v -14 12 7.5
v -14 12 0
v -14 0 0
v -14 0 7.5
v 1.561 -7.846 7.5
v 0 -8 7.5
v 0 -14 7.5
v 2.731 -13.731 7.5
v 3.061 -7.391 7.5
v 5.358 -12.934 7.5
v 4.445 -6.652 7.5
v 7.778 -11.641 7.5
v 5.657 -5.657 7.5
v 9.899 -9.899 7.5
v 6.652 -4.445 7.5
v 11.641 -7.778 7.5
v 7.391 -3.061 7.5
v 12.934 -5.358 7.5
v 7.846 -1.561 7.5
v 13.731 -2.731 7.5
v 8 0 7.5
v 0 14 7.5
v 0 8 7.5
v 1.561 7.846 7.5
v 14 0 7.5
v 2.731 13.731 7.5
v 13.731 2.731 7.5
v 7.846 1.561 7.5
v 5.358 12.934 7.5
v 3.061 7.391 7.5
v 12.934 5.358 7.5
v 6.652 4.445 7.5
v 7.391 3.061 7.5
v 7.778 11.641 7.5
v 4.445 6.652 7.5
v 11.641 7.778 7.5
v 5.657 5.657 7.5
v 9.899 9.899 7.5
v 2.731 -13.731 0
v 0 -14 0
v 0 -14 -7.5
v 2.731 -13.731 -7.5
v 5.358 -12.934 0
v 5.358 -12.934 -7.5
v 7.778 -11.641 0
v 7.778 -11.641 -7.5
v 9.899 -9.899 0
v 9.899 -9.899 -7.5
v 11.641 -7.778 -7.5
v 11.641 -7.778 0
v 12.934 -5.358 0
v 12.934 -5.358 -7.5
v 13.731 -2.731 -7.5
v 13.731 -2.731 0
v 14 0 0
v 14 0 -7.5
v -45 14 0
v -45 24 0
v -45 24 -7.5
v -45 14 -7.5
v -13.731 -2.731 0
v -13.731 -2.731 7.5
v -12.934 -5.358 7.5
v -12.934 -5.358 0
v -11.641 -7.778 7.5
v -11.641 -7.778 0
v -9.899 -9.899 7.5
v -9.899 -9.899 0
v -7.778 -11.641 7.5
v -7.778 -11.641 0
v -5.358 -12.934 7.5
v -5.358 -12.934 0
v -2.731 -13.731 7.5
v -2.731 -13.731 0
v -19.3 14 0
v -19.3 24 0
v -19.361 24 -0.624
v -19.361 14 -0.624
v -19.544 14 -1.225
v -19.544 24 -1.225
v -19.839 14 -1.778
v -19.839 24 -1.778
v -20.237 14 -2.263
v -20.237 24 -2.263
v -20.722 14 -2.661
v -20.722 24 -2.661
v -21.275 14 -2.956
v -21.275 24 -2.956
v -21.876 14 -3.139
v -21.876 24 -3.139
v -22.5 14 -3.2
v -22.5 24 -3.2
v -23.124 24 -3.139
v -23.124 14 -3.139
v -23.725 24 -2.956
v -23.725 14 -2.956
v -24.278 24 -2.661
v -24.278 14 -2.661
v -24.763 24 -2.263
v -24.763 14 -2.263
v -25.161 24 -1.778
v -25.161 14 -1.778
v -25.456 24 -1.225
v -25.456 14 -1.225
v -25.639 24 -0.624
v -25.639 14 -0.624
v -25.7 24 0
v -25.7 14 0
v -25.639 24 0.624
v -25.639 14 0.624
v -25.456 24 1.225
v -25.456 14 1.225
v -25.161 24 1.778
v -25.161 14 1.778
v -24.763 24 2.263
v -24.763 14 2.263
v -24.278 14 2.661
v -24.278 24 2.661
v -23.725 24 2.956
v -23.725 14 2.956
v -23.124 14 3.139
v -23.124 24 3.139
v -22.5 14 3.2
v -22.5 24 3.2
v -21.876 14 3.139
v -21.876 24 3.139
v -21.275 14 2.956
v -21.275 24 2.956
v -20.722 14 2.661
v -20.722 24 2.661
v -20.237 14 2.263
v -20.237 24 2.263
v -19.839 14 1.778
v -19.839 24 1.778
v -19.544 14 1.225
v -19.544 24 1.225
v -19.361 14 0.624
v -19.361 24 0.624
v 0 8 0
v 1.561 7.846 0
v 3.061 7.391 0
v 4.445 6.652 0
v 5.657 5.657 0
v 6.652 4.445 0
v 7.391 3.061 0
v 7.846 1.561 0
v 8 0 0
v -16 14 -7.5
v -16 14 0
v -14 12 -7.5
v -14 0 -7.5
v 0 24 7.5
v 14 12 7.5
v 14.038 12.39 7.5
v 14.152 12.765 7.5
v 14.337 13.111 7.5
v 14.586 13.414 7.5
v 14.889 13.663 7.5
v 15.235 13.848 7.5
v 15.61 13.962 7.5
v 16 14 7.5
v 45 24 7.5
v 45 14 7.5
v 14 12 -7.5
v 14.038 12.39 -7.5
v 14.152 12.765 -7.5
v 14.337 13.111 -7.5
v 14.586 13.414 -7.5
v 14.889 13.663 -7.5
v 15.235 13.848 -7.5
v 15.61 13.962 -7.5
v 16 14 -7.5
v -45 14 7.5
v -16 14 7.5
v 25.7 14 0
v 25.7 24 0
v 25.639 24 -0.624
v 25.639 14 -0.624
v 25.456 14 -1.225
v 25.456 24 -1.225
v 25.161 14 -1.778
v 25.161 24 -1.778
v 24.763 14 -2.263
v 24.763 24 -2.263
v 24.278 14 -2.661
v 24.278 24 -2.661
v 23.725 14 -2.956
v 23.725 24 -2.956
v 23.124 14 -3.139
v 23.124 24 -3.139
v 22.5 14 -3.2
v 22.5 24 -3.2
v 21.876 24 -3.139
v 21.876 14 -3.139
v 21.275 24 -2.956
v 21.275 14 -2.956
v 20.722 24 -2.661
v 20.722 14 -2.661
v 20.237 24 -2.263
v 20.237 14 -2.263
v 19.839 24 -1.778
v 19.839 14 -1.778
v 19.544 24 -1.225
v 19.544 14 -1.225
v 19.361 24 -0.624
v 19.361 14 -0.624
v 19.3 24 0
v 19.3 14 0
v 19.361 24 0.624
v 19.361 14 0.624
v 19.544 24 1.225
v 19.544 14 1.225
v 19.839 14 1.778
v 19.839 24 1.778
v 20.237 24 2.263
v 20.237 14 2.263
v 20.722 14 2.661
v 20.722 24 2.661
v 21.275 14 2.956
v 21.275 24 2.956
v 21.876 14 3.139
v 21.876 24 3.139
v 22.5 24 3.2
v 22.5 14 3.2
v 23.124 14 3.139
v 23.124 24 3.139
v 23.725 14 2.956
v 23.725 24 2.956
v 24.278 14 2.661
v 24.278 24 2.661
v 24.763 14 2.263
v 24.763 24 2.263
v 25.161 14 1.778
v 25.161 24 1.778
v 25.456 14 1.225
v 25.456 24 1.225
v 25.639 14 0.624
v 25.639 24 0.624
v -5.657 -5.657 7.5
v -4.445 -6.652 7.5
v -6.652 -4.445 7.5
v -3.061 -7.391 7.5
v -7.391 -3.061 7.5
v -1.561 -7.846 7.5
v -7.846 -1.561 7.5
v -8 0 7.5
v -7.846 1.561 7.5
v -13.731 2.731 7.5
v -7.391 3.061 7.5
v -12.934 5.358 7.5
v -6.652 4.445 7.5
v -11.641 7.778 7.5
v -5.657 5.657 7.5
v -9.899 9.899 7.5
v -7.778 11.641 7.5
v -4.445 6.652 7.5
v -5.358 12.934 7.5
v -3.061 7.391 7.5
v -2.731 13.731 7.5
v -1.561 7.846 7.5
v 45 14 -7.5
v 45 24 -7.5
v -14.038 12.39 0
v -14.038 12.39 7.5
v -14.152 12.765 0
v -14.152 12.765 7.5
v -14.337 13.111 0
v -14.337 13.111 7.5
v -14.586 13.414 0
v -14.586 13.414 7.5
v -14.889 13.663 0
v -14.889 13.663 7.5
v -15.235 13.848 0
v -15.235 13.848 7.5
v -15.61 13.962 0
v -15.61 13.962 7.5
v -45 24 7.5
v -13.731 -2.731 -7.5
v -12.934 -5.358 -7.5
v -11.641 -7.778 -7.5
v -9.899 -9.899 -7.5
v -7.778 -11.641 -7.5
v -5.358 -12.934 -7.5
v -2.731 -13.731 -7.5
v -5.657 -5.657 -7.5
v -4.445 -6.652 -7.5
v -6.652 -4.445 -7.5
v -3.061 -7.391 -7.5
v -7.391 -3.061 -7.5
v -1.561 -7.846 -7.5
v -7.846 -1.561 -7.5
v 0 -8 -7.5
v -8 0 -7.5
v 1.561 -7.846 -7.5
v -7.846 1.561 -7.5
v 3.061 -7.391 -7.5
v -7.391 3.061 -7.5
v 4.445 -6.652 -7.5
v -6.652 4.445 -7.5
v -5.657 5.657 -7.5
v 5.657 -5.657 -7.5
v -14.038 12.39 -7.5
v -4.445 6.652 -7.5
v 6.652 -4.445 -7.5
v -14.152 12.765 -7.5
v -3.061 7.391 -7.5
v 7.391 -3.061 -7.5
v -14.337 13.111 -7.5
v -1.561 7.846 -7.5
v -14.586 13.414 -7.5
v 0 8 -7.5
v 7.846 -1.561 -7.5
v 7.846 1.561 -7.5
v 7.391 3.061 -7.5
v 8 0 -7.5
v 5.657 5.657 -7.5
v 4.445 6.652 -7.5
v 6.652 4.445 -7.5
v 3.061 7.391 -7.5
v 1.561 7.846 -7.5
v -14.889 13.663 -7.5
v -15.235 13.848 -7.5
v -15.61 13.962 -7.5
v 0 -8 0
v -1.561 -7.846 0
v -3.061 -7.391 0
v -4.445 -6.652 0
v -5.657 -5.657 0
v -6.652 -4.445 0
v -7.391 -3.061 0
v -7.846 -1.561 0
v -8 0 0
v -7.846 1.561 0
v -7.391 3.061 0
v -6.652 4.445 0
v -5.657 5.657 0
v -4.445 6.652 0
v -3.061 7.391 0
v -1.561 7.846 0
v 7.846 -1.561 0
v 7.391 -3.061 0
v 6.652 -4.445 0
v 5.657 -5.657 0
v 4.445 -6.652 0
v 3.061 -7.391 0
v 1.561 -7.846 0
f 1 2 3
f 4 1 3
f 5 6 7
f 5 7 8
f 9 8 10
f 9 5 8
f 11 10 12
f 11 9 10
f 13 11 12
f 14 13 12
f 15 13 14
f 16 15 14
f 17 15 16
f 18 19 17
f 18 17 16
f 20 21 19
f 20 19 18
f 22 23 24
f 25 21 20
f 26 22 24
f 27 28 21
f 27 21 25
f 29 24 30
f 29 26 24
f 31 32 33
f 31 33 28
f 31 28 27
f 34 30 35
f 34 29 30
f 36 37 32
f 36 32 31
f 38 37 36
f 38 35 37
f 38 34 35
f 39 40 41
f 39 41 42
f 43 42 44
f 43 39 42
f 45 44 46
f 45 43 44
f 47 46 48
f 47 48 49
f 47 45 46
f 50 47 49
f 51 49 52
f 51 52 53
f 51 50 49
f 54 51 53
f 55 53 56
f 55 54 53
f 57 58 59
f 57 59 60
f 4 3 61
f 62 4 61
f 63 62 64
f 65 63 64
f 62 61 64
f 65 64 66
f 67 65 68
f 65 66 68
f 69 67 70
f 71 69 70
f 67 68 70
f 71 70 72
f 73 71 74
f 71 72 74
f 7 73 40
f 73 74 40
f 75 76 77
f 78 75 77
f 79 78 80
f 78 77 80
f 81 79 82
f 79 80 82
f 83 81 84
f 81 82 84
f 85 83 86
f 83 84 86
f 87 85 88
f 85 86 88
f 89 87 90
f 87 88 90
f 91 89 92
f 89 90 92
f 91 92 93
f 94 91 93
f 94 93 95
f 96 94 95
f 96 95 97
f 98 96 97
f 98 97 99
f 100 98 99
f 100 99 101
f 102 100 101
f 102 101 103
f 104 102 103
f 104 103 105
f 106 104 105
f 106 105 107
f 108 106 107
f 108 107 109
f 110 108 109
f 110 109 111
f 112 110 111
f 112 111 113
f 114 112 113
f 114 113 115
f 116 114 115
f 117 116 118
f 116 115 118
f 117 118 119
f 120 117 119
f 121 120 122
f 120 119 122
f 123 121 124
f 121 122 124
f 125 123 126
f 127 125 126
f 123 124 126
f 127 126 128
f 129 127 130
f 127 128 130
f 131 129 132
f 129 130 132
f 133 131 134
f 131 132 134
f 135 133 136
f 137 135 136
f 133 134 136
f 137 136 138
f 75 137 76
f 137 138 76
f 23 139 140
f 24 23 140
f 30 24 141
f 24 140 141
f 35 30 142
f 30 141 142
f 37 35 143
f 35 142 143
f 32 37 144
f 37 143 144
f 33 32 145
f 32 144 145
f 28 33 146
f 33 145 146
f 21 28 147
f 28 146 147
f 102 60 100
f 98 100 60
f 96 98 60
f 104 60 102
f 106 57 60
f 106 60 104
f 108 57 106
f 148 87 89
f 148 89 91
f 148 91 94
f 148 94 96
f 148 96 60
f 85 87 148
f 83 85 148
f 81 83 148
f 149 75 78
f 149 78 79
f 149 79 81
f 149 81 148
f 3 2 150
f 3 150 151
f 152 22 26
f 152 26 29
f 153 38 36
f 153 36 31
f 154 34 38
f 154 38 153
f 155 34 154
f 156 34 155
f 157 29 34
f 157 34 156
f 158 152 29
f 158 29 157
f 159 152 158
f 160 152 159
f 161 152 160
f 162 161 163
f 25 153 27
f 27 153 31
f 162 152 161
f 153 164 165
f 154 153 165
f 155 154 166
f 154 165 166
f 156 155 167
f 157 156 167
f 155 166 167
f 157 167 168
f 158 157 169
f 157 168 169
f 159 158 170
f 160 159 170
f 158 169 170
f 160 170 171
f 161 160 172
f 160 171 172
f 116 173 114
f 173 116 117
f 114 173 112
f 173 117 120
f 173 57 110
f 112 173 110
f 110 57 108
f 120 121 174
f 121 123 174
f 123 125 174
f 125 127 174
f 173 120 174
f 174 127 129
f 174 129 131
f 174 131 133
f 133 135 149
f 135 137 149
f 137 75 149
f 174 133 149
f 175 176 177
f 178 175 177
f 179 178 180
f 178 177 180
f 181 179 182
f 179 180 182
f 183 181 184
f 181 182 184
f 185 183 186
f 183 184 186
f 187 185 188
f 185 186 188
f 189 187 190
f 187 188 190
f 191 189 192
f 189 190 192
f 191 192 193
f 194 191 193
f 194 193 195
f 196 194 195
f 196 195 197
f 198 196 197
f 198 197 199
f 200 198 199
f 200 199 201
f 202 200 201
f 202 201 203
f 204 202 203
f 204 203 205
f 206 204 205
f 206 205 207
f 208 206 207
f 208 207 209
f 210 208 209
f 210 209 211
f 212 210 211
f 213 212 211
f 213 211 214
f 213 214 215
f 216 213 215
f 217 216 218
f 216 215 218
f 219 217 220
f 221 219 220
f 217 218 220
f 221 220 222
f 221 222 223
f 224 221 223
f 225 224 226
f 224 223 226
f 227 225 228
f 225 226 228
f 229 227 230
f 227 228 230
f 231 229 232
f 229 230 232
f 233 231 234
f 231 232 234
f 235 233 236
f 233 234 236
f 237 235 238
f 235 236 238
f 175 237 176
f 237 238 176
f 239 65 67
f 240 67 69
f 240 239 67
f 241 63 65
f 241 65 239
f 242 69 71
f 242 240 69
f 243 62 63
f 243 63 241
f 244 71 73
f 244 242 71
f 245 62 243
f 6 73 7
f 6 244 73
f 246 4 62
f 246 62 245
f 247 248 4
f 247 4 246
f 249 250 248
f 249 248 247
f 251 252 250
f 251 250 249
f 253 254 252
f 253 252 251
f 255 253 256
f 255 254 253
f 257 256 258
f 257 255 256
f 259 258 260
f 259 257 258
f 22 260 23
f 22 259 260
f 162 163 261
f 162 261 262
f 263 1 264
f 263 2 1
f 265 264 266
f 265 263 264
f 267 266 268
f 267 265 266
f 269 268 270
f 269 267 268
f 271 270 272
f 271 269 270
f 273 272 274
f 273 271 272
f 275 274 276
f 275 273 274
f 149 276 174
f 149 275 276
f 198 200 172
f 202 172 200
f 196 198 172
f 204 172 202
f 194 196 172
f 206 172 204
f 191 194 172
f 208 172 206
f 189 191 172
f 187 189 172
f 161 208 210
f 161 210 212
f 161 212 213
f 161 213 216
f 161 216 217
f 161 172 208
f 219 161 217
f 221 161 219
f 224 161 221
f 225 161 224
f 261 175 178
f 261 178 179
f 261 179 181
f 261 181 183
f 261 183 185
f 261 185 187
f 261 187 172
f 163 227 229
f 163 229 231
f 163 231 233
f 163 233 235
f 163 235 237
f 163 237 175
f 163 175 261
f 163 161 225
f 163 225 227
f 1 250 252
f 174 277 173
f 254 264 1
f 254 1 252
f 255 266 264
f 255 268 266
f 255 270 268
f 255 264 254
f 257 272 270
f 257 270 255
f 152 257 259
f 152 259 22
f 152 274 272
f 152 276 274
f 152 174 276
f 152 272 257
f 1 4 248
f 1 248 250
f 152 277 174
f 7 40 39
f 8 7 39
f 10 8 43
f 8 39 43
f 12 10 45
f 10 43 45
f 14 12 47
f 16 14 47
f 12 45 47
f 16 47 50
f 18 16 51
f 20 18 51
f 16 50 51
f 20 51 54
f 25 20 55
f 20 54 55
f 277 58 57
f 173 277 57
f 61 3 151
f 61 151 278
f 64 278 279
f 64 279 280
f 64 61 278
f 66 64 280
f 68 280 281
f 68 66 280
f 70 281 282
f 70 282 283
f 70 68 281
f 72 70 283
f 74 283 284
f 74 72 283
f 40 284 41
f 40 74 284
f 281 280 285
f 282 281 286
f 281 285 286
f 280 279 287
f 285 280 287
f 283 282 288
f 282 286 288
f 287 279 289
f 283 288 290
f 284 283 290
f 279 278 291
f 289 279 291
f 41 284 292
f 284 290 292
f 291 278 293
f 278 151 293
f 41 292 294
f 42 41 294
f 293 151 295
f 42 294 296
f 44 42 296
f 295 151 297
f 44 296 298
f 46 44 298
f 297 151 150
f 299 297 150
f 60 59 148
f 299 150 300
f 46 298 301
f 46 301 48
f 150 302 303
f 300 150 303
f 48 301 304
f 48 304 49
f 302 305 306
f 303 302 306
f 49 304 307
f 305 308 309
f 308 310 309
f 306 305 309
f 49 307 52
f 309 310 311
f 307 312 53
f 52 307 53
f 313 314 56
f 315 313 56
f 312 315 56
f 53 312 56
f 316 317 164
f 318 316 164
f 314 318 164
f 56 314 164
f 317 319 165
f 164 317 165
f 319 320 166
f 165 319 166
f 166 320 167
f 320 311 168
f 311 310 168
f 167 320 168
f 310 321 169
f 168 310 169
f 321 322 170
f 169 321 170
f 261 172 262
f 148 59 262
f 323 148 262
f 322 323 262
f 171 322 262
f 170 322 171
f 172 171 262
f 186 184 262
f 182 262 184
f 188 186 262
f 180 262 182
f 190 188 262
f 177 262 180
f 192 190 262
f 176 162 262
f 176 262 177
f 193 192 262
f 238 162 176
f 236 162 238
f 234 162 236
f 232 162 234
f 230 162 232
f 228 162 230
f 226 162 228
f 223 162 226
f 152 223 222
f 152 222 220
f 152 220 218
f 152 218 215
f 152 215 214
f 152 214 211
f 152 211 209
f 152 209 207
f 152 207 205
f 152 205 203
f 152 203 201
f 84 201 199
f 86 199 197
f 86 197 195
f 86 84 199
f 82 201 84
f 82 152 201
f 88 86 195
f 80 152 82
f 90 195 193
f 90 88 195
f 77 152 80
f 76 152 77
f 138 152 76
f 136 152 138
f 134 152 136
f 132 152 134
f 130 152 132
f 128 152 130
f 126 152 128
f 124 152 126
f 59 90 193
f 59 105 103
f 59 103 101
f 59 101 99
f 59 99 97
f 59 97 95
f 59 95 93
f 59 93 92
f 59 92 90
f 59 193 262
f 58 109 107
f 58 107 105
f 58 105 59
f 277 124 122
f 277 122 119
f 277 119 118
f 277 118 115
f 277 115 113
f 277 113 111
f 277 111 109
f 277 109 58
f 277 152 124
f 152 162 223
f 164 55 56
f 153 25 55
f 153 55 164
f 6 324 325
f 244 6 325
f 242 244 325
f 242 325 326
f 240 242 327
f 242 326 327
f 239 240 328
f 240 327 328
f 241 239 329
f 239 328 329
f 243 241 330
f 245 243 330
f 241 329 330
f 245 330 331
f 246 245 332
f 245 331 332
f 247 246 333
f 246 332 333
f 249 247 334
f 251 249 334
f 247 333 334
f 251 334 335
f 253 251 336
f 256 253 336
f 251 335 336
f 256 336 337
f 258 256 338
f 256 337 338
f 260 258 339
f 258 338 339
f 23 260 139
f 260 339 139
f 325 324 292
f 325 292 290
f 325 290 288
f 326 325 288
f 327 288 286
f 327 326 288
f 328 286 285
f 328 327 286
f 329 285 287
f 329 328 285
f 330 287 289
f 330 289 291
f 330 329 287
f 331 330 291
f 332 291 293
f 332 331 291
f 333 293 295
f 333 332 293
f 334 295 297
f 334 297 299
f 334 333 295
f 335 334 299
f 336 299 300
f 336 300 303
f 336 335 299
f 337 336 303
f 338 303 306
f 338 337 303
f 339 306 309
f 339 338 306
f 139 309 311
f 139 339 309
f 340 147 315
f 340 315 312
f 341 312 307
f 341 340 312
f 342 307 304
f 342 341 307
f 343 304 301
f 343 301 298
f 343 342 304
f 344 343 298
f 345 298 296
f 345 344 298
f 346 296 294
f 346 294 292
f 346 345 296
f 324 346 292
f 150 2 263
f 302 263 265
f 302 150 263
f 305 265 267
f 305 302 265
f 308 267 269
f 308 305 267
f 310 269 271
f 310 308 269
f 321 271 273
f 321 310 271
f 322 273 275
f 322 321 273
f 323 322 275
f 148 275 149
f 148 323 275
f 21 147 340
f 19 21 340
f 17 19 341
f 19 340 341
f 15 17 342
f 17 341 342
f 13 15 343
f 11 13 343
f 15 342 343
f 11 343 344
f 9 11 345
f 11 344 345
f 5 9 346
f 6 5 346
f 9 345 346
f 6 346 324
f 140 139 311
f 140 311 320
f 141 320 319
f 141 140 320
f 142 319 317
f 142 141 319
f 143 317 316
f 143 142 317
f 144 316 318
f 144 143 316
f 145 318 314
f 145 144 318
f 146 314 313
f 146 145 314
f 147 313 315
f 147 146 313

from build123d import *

# Parameters (mm, degrees)
CROQUIS1_R                       = 8
SALIENTE_EXTRUIR1_DEPTH          = 7.5
TALADRO_DE_MARGEN_PARA_M61_D     = 6.4
TALADRO_DE_MARGEN_PARA_M61_DEPTH = 20
TALADRO_DE_MARGEN_PARA_M61_TIP   = 1.922753981
REDONDEO1_R                      = 2


with BuildPart() as part:
    # Croquis1 → Saliente-Extruir1 (new, symmetric)
    with BuildSketch(Plane.XY):
        with BuildLine():
            Line((-14, 14), (-14, 0))
            ThreePointArc((-14, 0), (0, -14), (14, 0))
            Line((14, 0), (14, 14))
            Line((14, 14), (45, 14))
            Line((45, 14), (45, 24))
            Line((45, 24), (-45, 24))
            Line((-45, 24), (-45, 14))
            Line((-45, 14), (-14, 14))
        make_face()
        Circle(CROQUIS1_R, mode=Mode.SUBTRACT)
    extrude(amount=SALIENTE_EXTRUIR1_DEPTH, both=True)

    # Taladro de margen para M61
    with Locations(Plane(origin=(0, 14, 0), x_dir=(-1, 0, 0), z_dir=(0, -1, 0))):
        with Locations((22.5, 0), (-22.5, 0)):
            Hole(TALADRO_DE_MARGEN_PARA_M61_D / 2, depth=TALADRO_DE_MARGEN_PARA_M61_DEPTH)
            with Locations((0, 0, -(TALADRO_DE_MARGEN_PARA_M61_DEPTH + TALADRO_DE_MARGEN_PARA_M61_TIP / 2))):  # 118° drill point
                Cone(0, TALADRO_DE_MARGEN_PARA_M61_D / 2, TALADRO_DE_MARGEN_PARA_M61_TIP, mode=Mode.SUBTRACT)

    # Redondeo1
    redondeo1_edges = [part.edges().sort_by_distance(p)[0] for p in [
        (-14, 14, 0),
        (14, 14, 0),
    ]]
    fillet(redondeo1_edges, radius=REDONDEO1_R)


solid = part.part
